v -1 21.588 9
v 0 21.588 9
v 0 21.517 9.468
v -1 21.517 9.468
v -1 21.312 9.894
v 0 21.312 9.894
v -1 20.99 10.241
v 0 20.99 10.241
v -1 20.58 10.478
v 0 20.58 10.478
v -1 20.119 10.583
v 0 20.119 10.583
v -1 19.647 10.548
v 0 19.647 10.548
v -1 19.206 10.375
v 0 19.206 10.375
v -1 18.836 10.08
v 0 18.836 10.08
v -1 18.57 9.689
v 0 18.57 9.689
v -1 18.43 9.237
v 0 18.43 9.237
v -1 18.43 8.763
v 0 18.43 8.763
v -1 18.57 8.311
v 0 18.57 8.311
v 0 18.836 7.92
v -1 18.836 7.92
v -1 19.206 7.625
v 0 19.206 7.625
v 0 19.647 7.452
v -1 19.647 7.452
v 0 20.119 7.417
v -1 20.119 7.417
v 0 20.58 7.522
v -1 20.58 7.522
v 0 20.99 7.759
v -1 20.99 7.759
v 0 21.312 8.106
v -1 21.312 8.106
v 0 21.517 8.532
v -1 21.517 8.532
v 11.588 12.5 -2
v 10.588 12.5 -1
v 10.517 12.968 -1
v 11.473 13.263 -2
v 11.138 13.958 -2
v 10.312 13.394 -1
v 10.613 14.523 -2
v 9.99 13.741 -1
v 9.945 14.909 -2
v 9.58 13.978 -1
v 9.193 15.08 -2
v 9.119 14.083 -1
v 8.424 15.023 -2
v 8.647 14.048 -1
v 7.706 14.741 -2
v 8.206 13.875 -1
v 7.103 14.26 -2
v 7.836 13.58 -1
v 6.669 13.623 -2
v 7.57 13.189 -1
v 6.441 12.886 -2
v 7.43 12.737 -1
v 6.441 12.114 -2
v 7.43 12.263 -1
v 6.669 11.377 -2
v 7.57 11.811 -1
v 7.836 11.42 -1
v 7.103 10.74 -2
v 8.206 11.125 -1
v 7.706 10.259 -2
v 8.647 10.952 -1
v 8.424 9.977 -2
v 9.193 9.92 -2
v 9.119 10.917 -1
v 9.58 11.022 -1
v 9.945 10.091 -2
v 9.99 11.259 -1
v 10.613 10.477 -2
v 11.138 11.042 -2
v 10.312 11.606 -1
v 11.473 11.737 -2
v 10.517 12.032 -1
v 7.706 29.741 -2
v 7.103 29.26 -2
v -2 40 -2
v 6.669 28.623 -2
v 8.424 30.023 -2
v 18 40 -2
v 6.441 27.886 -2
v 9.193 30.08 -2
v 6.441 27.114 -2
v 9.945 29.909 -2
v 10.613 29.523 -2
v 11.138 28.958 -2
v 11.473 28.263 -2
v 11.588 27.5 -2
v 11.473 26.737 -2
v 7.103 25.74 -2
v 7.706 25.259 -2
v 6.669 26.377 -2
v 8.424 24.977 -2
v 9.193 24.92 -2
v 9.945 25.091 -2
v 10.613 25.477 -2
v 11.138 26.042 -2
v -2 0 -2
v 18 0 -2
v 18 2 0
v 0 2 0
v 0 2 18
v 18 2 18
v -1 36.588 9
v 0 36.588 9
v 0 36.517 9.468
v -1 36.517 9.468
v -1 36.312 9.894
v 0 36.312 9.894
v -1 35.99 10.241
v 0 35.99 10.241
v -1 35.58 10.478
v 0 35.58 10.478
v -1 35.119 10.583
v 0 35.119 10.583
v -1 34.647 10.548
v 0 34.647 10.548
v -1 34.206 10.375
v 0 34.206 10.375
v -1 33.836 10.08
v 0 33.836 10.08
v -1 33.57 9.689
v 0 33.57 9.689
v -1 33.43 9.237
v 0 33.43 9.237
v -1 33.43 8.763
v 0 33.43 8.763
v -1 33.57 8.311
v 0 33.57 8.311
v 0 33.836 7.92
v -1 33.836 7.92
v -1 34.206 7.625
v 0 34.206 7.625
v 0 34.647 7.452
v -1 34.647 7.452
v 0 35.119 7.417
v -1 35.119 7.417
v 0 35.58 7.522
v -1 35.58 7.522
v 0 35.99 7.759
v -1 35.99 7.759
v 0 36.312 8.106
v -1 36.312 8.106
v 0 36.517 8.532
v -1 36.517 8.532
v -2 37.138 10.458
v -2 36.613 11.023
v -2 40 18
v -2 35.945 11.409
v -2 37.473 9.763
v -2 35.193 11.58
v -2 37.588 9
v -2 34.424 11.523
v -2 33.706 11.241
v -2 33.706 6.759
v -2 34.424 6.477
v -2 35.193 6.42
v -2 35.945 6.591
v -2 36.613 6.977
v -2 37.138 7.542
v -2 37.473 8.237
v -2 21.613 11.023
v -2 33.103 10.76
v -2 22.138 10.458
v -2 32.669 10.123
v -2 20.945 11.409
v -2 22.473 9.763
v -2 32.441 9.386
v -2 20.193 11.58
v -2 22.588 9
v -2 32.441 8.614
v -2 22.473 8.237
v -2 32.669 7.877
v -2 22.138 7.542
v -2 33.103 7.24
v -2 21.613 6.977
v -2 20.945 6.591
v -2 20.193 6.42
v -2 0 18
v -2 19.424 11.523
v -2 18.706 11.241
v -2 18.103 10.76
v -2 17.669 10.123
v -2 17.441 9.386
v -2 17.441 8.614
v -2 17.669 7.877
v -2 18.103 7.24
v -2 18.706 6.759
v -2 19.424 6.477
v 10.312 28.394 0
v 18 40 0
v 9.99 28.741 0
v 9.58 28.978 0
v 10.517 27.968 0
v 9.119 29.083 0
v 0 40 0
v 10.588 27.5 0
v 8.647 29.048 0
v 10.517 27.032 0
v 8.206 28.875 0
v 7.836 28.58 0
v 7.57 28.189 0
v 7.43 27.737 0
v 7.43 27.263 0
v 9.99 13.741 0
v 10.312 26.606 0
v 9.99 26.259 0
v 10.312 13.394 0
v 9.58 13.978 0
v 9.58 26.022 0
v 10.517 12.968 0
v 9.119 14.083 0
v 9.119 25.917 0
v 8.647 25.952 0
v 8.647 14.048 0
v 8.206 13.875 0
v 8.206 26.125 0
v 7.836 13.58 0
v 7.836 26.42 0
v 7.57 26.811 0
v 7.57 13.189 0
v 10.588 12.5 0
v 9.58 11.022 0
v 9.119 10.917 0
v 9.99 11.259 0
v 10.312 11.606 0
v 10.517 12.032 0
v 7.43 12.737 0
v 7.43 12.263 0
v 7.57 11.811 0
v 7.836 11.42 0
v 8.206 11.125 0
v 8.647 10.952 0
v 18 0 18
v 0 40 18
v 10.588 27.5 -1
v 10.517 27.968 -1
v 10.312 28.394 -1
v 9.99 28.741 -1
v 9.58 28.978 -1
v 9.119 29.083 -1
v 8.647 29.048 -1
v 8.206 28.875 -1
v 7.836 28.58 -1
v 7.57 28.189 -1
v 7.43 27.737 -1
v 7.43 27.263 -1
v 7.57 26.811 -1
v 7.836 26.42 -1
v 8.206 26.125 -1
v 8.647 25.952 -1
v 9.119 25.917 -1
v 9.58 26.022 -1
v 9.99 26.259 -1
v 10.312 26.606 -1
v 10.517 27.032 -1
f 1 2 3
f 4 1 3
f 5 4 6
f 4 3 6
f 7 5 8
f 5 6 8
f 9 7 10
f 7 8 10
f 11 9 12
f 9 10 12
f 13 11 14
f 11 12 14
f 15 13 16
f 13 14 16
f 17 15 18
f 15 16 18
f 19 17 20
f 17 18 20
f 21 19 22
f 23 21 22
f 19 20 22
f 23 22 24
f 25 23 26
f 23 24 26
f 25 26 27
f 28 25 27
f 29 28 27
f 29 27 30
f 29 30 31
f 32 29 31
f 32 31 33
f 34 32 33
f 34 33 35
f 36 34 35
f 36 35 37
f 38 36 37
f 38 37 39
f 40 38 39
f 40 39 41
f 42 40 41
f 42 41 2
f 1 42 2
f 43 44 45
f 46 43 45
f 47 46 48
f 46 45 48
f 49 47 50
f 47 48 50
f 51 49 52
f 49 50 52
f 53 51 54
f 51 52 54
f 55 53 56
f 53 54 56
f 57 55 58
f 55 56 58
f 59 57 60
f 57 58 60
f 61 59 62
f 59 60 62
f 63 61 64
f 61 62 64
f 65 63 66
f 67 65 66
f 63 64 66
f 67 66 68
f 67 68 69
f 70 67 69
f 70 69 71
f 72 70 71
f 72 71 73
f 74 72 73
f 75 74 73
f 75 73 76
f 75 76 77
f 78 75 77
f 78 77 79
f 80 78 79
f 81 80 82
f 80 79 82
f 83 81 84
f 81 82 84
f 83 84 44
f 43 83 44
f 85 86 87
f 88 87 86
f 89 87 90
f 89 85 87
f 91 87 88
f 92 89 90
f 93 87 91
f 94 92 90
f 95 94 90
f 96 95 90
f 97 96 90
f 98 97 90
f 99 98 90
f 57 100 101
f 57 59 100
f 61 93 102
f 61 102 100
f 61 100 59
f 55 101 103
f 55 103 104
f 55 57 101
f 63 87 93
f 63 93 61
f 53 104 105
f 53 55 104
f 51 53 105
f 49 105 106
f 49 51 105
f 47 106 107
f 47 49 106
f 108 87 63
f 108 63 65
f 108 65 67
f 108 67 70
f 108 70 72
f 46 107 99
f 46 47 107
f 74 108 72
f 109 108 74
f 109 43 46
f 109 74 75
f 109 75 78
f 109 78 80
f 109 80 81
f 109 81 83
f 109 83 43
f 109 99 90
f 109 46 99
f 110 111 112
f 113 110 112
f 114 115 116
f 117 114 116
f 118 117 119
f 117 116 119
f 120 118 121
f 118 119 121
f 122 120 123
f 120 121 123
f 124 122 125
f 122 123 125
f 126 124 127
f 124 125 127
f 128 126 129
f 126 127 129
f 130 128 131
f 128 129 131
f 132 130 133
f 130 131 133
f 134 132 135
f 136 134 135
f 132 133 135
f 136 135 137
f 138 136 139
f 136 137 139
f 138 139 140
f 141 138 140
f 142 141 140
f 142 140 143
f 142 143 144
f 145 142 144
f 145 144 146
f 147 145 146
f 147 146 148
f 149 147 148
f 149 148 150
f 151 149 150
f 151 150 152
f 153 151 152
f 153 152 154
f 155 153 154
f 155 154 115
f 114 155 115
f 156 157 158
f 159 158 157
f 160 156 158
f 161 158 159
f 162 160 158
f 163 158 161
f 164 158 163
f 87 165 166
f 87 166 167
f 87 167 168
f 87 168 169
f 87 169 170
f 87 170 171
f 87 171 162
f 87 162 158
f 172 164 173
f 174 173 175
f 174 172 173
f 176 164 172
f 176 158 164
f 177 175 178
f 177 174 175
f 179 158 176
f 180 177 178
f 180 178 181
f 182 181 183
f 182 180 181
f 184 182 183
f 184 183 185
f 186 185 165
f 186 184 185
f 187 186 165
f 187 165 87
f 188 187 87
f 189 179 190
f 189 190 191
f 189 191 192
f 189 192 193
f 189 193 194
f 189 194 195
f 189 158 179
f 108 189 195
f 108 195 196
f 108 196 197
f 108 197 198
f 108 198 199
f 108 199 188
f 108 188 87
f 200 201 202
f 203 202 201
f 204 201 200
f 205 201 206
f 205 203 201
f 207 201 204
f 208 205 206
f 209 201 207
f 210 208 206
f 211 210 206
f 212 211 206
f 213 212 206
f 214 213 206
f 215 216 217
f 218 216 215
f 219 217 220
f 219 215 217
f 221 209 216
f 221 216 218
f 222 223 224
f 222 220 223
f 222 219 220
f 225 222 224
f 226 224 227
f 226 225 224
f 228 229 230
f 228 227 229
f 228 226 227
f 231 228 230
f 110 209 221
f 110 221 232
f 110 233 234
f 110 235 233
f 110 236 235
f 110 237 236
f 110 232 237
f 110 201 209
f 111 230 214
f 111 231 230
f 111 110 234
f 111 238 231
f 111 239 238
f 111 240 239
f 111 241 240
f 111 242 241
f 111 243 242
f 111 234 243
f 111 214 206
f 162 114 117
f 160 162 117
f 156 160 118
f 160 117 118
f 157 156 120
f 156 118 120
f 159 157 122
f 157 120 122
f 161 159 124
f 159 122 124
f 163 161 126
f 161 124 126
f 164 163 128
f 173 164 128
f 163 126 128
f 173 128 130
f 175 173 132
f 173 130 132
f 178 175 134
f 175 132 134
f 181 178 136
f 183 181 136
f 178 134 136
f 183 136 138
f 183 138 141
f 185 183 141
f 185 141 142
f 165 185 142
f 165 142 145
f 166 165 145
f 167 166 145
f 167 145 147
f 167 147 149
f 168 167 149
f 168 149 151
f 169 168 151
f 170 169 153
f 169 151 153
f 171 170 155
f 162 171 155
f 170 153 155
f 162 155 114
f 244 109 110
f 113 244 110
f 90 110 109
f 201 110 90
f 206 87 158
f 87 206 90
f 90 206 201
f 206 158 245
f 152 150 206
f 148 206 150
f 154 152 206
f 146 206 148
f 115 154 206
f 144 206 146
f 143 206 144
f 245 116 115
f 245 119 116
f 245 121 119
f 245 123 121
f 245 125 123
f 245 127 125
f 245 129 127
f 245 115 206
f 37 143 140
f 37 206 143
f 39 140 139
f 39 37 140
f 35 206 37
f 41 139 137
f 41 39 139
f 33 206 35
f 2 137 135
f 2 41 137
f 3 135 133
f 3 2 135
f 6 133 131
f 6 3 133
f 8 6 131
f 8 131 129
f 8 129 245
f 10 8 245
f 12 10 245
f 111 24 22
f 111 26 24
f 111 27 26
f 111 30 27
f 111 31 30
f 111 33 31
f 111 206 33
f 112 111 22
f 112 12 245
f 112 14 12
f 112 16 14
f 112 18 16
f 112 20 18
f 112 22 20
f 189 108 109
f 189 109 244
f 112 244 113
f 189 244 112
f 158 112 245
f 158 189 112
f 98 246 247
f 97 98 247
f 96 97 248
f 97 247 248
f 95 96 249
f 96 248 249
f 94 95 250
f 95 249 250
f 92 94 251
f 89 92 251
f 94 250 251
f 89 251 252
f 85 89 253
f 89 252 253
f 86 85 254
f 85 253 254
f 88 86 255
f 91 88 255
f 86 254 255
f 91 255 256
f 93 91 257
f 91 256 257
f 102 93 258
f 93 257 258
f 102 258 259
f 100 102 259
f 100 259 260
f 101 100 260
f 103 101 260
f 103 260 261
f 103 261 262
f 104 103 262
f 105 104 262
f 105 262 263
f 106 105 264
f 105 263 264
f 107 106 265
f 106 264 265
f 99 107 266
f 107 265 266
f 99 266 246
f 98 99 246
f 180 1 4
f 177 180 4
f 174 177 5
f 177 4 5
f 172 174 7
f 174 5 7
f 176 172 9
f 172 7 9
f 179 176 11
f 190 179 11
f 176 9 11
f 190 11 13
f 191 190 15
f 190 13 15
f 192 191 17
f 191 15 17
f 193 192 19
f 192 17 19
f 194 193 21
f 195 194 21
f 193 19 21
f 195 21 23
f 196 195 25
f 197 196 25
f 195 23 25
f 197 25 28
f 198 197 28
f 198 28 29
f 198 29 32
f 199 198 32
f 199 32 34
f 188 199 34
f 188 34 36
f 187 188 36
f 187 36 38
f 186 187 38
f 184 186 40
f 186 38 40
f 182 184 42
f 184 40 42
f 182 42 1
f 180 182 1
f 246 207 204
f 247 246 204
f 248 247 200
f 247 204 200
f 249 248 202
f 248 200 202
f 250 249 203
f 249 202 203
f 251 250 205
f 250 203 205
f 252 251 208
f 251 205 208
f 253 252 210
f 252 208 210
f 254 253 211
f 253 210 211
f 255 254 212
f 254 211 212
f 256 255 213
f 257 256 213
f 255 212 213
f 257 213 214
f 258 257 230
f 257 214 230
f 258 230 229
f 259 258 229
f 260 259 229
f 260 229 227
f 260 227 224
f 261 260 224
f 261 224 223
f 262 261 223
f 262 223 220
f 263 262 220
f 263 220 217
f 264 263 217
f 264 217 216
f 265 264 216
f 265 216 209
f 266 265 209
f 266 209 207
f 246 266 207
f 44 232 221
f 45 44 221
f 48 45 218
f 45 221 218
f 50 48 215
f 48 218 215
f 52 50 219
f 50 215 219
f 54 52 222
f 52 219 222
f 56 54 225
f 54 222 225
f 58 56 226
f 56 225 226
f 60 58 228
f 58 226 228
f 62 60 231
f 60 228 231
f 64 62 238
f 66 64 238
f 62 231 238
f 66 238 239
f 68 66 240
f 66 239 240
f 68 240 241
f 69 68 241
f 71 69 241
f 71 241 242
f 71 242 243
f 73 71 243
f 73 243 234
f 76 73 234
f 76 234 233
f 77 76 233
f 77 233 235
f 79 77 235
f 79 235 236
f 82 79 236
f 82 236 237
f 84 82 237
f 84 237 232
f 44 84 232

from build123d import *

# Parameters (mm, degrees)
F1_DEPTH = 40
F2_W     = 2
F2_H     = 18
F3_DEPTH = 18
F4_R     = 1.5875
F5_DEPTH = 2.001
F6_R     = 1.5875
F7_DEPTH = 2.001
F8_SIZE  = 1


with BuildPart() as f1:
    # F0 (on Front) → F1 (new body)
    with BuildSketch(Plane.XZ):
        Polygon((-2, 18), (-2, -2), (18, -2), (18, 0), (0, 0), (0, 18), align=None)
    extrude(amount=-F1_DEPTH)

    # F2 (on face) → F3 (join, through all)
    with BuildSketch(Plane.YZ):
        with Locations((1, 9)):
            Rectangle(F2_W, F2_H)
    extrude(amount=F3_DEPTH)

    # F4 (on face) → F5 (cut, through all)
    with BuildSketch(Plane.XY):
        with Locations((9, 12.5)):
            Circle(F4_R)
        with Locations((9, 27.5)):
            Circle(F4_R)
    extrude(amount=-F5_DEPTH, mode=Mode.SUBTRACT)

    # F6 (on face) → F7 (cut, through all)
    with BuildSketch(Plane.YZ):
        with Locations((35, 9)):
            Circle(F6_R)
        with Locations((20, 9)):
            Circle(F6_R)
    extrude(amount=-F7_DEPTH, mode=Mode.SUBTRACT)

    # F8
    f8_edges = [f1.edges().sort_by_distance(p)[0] for p in [
        (-2, 18.4125, 9),
        (-2, 33.4125, 9),
        (7.4125, 27.5, -2),
        (7.4125, 12.5, -2),
    ]]
    chamfer(f8_edges, length=F8_SIZE)


solid = f1.part
